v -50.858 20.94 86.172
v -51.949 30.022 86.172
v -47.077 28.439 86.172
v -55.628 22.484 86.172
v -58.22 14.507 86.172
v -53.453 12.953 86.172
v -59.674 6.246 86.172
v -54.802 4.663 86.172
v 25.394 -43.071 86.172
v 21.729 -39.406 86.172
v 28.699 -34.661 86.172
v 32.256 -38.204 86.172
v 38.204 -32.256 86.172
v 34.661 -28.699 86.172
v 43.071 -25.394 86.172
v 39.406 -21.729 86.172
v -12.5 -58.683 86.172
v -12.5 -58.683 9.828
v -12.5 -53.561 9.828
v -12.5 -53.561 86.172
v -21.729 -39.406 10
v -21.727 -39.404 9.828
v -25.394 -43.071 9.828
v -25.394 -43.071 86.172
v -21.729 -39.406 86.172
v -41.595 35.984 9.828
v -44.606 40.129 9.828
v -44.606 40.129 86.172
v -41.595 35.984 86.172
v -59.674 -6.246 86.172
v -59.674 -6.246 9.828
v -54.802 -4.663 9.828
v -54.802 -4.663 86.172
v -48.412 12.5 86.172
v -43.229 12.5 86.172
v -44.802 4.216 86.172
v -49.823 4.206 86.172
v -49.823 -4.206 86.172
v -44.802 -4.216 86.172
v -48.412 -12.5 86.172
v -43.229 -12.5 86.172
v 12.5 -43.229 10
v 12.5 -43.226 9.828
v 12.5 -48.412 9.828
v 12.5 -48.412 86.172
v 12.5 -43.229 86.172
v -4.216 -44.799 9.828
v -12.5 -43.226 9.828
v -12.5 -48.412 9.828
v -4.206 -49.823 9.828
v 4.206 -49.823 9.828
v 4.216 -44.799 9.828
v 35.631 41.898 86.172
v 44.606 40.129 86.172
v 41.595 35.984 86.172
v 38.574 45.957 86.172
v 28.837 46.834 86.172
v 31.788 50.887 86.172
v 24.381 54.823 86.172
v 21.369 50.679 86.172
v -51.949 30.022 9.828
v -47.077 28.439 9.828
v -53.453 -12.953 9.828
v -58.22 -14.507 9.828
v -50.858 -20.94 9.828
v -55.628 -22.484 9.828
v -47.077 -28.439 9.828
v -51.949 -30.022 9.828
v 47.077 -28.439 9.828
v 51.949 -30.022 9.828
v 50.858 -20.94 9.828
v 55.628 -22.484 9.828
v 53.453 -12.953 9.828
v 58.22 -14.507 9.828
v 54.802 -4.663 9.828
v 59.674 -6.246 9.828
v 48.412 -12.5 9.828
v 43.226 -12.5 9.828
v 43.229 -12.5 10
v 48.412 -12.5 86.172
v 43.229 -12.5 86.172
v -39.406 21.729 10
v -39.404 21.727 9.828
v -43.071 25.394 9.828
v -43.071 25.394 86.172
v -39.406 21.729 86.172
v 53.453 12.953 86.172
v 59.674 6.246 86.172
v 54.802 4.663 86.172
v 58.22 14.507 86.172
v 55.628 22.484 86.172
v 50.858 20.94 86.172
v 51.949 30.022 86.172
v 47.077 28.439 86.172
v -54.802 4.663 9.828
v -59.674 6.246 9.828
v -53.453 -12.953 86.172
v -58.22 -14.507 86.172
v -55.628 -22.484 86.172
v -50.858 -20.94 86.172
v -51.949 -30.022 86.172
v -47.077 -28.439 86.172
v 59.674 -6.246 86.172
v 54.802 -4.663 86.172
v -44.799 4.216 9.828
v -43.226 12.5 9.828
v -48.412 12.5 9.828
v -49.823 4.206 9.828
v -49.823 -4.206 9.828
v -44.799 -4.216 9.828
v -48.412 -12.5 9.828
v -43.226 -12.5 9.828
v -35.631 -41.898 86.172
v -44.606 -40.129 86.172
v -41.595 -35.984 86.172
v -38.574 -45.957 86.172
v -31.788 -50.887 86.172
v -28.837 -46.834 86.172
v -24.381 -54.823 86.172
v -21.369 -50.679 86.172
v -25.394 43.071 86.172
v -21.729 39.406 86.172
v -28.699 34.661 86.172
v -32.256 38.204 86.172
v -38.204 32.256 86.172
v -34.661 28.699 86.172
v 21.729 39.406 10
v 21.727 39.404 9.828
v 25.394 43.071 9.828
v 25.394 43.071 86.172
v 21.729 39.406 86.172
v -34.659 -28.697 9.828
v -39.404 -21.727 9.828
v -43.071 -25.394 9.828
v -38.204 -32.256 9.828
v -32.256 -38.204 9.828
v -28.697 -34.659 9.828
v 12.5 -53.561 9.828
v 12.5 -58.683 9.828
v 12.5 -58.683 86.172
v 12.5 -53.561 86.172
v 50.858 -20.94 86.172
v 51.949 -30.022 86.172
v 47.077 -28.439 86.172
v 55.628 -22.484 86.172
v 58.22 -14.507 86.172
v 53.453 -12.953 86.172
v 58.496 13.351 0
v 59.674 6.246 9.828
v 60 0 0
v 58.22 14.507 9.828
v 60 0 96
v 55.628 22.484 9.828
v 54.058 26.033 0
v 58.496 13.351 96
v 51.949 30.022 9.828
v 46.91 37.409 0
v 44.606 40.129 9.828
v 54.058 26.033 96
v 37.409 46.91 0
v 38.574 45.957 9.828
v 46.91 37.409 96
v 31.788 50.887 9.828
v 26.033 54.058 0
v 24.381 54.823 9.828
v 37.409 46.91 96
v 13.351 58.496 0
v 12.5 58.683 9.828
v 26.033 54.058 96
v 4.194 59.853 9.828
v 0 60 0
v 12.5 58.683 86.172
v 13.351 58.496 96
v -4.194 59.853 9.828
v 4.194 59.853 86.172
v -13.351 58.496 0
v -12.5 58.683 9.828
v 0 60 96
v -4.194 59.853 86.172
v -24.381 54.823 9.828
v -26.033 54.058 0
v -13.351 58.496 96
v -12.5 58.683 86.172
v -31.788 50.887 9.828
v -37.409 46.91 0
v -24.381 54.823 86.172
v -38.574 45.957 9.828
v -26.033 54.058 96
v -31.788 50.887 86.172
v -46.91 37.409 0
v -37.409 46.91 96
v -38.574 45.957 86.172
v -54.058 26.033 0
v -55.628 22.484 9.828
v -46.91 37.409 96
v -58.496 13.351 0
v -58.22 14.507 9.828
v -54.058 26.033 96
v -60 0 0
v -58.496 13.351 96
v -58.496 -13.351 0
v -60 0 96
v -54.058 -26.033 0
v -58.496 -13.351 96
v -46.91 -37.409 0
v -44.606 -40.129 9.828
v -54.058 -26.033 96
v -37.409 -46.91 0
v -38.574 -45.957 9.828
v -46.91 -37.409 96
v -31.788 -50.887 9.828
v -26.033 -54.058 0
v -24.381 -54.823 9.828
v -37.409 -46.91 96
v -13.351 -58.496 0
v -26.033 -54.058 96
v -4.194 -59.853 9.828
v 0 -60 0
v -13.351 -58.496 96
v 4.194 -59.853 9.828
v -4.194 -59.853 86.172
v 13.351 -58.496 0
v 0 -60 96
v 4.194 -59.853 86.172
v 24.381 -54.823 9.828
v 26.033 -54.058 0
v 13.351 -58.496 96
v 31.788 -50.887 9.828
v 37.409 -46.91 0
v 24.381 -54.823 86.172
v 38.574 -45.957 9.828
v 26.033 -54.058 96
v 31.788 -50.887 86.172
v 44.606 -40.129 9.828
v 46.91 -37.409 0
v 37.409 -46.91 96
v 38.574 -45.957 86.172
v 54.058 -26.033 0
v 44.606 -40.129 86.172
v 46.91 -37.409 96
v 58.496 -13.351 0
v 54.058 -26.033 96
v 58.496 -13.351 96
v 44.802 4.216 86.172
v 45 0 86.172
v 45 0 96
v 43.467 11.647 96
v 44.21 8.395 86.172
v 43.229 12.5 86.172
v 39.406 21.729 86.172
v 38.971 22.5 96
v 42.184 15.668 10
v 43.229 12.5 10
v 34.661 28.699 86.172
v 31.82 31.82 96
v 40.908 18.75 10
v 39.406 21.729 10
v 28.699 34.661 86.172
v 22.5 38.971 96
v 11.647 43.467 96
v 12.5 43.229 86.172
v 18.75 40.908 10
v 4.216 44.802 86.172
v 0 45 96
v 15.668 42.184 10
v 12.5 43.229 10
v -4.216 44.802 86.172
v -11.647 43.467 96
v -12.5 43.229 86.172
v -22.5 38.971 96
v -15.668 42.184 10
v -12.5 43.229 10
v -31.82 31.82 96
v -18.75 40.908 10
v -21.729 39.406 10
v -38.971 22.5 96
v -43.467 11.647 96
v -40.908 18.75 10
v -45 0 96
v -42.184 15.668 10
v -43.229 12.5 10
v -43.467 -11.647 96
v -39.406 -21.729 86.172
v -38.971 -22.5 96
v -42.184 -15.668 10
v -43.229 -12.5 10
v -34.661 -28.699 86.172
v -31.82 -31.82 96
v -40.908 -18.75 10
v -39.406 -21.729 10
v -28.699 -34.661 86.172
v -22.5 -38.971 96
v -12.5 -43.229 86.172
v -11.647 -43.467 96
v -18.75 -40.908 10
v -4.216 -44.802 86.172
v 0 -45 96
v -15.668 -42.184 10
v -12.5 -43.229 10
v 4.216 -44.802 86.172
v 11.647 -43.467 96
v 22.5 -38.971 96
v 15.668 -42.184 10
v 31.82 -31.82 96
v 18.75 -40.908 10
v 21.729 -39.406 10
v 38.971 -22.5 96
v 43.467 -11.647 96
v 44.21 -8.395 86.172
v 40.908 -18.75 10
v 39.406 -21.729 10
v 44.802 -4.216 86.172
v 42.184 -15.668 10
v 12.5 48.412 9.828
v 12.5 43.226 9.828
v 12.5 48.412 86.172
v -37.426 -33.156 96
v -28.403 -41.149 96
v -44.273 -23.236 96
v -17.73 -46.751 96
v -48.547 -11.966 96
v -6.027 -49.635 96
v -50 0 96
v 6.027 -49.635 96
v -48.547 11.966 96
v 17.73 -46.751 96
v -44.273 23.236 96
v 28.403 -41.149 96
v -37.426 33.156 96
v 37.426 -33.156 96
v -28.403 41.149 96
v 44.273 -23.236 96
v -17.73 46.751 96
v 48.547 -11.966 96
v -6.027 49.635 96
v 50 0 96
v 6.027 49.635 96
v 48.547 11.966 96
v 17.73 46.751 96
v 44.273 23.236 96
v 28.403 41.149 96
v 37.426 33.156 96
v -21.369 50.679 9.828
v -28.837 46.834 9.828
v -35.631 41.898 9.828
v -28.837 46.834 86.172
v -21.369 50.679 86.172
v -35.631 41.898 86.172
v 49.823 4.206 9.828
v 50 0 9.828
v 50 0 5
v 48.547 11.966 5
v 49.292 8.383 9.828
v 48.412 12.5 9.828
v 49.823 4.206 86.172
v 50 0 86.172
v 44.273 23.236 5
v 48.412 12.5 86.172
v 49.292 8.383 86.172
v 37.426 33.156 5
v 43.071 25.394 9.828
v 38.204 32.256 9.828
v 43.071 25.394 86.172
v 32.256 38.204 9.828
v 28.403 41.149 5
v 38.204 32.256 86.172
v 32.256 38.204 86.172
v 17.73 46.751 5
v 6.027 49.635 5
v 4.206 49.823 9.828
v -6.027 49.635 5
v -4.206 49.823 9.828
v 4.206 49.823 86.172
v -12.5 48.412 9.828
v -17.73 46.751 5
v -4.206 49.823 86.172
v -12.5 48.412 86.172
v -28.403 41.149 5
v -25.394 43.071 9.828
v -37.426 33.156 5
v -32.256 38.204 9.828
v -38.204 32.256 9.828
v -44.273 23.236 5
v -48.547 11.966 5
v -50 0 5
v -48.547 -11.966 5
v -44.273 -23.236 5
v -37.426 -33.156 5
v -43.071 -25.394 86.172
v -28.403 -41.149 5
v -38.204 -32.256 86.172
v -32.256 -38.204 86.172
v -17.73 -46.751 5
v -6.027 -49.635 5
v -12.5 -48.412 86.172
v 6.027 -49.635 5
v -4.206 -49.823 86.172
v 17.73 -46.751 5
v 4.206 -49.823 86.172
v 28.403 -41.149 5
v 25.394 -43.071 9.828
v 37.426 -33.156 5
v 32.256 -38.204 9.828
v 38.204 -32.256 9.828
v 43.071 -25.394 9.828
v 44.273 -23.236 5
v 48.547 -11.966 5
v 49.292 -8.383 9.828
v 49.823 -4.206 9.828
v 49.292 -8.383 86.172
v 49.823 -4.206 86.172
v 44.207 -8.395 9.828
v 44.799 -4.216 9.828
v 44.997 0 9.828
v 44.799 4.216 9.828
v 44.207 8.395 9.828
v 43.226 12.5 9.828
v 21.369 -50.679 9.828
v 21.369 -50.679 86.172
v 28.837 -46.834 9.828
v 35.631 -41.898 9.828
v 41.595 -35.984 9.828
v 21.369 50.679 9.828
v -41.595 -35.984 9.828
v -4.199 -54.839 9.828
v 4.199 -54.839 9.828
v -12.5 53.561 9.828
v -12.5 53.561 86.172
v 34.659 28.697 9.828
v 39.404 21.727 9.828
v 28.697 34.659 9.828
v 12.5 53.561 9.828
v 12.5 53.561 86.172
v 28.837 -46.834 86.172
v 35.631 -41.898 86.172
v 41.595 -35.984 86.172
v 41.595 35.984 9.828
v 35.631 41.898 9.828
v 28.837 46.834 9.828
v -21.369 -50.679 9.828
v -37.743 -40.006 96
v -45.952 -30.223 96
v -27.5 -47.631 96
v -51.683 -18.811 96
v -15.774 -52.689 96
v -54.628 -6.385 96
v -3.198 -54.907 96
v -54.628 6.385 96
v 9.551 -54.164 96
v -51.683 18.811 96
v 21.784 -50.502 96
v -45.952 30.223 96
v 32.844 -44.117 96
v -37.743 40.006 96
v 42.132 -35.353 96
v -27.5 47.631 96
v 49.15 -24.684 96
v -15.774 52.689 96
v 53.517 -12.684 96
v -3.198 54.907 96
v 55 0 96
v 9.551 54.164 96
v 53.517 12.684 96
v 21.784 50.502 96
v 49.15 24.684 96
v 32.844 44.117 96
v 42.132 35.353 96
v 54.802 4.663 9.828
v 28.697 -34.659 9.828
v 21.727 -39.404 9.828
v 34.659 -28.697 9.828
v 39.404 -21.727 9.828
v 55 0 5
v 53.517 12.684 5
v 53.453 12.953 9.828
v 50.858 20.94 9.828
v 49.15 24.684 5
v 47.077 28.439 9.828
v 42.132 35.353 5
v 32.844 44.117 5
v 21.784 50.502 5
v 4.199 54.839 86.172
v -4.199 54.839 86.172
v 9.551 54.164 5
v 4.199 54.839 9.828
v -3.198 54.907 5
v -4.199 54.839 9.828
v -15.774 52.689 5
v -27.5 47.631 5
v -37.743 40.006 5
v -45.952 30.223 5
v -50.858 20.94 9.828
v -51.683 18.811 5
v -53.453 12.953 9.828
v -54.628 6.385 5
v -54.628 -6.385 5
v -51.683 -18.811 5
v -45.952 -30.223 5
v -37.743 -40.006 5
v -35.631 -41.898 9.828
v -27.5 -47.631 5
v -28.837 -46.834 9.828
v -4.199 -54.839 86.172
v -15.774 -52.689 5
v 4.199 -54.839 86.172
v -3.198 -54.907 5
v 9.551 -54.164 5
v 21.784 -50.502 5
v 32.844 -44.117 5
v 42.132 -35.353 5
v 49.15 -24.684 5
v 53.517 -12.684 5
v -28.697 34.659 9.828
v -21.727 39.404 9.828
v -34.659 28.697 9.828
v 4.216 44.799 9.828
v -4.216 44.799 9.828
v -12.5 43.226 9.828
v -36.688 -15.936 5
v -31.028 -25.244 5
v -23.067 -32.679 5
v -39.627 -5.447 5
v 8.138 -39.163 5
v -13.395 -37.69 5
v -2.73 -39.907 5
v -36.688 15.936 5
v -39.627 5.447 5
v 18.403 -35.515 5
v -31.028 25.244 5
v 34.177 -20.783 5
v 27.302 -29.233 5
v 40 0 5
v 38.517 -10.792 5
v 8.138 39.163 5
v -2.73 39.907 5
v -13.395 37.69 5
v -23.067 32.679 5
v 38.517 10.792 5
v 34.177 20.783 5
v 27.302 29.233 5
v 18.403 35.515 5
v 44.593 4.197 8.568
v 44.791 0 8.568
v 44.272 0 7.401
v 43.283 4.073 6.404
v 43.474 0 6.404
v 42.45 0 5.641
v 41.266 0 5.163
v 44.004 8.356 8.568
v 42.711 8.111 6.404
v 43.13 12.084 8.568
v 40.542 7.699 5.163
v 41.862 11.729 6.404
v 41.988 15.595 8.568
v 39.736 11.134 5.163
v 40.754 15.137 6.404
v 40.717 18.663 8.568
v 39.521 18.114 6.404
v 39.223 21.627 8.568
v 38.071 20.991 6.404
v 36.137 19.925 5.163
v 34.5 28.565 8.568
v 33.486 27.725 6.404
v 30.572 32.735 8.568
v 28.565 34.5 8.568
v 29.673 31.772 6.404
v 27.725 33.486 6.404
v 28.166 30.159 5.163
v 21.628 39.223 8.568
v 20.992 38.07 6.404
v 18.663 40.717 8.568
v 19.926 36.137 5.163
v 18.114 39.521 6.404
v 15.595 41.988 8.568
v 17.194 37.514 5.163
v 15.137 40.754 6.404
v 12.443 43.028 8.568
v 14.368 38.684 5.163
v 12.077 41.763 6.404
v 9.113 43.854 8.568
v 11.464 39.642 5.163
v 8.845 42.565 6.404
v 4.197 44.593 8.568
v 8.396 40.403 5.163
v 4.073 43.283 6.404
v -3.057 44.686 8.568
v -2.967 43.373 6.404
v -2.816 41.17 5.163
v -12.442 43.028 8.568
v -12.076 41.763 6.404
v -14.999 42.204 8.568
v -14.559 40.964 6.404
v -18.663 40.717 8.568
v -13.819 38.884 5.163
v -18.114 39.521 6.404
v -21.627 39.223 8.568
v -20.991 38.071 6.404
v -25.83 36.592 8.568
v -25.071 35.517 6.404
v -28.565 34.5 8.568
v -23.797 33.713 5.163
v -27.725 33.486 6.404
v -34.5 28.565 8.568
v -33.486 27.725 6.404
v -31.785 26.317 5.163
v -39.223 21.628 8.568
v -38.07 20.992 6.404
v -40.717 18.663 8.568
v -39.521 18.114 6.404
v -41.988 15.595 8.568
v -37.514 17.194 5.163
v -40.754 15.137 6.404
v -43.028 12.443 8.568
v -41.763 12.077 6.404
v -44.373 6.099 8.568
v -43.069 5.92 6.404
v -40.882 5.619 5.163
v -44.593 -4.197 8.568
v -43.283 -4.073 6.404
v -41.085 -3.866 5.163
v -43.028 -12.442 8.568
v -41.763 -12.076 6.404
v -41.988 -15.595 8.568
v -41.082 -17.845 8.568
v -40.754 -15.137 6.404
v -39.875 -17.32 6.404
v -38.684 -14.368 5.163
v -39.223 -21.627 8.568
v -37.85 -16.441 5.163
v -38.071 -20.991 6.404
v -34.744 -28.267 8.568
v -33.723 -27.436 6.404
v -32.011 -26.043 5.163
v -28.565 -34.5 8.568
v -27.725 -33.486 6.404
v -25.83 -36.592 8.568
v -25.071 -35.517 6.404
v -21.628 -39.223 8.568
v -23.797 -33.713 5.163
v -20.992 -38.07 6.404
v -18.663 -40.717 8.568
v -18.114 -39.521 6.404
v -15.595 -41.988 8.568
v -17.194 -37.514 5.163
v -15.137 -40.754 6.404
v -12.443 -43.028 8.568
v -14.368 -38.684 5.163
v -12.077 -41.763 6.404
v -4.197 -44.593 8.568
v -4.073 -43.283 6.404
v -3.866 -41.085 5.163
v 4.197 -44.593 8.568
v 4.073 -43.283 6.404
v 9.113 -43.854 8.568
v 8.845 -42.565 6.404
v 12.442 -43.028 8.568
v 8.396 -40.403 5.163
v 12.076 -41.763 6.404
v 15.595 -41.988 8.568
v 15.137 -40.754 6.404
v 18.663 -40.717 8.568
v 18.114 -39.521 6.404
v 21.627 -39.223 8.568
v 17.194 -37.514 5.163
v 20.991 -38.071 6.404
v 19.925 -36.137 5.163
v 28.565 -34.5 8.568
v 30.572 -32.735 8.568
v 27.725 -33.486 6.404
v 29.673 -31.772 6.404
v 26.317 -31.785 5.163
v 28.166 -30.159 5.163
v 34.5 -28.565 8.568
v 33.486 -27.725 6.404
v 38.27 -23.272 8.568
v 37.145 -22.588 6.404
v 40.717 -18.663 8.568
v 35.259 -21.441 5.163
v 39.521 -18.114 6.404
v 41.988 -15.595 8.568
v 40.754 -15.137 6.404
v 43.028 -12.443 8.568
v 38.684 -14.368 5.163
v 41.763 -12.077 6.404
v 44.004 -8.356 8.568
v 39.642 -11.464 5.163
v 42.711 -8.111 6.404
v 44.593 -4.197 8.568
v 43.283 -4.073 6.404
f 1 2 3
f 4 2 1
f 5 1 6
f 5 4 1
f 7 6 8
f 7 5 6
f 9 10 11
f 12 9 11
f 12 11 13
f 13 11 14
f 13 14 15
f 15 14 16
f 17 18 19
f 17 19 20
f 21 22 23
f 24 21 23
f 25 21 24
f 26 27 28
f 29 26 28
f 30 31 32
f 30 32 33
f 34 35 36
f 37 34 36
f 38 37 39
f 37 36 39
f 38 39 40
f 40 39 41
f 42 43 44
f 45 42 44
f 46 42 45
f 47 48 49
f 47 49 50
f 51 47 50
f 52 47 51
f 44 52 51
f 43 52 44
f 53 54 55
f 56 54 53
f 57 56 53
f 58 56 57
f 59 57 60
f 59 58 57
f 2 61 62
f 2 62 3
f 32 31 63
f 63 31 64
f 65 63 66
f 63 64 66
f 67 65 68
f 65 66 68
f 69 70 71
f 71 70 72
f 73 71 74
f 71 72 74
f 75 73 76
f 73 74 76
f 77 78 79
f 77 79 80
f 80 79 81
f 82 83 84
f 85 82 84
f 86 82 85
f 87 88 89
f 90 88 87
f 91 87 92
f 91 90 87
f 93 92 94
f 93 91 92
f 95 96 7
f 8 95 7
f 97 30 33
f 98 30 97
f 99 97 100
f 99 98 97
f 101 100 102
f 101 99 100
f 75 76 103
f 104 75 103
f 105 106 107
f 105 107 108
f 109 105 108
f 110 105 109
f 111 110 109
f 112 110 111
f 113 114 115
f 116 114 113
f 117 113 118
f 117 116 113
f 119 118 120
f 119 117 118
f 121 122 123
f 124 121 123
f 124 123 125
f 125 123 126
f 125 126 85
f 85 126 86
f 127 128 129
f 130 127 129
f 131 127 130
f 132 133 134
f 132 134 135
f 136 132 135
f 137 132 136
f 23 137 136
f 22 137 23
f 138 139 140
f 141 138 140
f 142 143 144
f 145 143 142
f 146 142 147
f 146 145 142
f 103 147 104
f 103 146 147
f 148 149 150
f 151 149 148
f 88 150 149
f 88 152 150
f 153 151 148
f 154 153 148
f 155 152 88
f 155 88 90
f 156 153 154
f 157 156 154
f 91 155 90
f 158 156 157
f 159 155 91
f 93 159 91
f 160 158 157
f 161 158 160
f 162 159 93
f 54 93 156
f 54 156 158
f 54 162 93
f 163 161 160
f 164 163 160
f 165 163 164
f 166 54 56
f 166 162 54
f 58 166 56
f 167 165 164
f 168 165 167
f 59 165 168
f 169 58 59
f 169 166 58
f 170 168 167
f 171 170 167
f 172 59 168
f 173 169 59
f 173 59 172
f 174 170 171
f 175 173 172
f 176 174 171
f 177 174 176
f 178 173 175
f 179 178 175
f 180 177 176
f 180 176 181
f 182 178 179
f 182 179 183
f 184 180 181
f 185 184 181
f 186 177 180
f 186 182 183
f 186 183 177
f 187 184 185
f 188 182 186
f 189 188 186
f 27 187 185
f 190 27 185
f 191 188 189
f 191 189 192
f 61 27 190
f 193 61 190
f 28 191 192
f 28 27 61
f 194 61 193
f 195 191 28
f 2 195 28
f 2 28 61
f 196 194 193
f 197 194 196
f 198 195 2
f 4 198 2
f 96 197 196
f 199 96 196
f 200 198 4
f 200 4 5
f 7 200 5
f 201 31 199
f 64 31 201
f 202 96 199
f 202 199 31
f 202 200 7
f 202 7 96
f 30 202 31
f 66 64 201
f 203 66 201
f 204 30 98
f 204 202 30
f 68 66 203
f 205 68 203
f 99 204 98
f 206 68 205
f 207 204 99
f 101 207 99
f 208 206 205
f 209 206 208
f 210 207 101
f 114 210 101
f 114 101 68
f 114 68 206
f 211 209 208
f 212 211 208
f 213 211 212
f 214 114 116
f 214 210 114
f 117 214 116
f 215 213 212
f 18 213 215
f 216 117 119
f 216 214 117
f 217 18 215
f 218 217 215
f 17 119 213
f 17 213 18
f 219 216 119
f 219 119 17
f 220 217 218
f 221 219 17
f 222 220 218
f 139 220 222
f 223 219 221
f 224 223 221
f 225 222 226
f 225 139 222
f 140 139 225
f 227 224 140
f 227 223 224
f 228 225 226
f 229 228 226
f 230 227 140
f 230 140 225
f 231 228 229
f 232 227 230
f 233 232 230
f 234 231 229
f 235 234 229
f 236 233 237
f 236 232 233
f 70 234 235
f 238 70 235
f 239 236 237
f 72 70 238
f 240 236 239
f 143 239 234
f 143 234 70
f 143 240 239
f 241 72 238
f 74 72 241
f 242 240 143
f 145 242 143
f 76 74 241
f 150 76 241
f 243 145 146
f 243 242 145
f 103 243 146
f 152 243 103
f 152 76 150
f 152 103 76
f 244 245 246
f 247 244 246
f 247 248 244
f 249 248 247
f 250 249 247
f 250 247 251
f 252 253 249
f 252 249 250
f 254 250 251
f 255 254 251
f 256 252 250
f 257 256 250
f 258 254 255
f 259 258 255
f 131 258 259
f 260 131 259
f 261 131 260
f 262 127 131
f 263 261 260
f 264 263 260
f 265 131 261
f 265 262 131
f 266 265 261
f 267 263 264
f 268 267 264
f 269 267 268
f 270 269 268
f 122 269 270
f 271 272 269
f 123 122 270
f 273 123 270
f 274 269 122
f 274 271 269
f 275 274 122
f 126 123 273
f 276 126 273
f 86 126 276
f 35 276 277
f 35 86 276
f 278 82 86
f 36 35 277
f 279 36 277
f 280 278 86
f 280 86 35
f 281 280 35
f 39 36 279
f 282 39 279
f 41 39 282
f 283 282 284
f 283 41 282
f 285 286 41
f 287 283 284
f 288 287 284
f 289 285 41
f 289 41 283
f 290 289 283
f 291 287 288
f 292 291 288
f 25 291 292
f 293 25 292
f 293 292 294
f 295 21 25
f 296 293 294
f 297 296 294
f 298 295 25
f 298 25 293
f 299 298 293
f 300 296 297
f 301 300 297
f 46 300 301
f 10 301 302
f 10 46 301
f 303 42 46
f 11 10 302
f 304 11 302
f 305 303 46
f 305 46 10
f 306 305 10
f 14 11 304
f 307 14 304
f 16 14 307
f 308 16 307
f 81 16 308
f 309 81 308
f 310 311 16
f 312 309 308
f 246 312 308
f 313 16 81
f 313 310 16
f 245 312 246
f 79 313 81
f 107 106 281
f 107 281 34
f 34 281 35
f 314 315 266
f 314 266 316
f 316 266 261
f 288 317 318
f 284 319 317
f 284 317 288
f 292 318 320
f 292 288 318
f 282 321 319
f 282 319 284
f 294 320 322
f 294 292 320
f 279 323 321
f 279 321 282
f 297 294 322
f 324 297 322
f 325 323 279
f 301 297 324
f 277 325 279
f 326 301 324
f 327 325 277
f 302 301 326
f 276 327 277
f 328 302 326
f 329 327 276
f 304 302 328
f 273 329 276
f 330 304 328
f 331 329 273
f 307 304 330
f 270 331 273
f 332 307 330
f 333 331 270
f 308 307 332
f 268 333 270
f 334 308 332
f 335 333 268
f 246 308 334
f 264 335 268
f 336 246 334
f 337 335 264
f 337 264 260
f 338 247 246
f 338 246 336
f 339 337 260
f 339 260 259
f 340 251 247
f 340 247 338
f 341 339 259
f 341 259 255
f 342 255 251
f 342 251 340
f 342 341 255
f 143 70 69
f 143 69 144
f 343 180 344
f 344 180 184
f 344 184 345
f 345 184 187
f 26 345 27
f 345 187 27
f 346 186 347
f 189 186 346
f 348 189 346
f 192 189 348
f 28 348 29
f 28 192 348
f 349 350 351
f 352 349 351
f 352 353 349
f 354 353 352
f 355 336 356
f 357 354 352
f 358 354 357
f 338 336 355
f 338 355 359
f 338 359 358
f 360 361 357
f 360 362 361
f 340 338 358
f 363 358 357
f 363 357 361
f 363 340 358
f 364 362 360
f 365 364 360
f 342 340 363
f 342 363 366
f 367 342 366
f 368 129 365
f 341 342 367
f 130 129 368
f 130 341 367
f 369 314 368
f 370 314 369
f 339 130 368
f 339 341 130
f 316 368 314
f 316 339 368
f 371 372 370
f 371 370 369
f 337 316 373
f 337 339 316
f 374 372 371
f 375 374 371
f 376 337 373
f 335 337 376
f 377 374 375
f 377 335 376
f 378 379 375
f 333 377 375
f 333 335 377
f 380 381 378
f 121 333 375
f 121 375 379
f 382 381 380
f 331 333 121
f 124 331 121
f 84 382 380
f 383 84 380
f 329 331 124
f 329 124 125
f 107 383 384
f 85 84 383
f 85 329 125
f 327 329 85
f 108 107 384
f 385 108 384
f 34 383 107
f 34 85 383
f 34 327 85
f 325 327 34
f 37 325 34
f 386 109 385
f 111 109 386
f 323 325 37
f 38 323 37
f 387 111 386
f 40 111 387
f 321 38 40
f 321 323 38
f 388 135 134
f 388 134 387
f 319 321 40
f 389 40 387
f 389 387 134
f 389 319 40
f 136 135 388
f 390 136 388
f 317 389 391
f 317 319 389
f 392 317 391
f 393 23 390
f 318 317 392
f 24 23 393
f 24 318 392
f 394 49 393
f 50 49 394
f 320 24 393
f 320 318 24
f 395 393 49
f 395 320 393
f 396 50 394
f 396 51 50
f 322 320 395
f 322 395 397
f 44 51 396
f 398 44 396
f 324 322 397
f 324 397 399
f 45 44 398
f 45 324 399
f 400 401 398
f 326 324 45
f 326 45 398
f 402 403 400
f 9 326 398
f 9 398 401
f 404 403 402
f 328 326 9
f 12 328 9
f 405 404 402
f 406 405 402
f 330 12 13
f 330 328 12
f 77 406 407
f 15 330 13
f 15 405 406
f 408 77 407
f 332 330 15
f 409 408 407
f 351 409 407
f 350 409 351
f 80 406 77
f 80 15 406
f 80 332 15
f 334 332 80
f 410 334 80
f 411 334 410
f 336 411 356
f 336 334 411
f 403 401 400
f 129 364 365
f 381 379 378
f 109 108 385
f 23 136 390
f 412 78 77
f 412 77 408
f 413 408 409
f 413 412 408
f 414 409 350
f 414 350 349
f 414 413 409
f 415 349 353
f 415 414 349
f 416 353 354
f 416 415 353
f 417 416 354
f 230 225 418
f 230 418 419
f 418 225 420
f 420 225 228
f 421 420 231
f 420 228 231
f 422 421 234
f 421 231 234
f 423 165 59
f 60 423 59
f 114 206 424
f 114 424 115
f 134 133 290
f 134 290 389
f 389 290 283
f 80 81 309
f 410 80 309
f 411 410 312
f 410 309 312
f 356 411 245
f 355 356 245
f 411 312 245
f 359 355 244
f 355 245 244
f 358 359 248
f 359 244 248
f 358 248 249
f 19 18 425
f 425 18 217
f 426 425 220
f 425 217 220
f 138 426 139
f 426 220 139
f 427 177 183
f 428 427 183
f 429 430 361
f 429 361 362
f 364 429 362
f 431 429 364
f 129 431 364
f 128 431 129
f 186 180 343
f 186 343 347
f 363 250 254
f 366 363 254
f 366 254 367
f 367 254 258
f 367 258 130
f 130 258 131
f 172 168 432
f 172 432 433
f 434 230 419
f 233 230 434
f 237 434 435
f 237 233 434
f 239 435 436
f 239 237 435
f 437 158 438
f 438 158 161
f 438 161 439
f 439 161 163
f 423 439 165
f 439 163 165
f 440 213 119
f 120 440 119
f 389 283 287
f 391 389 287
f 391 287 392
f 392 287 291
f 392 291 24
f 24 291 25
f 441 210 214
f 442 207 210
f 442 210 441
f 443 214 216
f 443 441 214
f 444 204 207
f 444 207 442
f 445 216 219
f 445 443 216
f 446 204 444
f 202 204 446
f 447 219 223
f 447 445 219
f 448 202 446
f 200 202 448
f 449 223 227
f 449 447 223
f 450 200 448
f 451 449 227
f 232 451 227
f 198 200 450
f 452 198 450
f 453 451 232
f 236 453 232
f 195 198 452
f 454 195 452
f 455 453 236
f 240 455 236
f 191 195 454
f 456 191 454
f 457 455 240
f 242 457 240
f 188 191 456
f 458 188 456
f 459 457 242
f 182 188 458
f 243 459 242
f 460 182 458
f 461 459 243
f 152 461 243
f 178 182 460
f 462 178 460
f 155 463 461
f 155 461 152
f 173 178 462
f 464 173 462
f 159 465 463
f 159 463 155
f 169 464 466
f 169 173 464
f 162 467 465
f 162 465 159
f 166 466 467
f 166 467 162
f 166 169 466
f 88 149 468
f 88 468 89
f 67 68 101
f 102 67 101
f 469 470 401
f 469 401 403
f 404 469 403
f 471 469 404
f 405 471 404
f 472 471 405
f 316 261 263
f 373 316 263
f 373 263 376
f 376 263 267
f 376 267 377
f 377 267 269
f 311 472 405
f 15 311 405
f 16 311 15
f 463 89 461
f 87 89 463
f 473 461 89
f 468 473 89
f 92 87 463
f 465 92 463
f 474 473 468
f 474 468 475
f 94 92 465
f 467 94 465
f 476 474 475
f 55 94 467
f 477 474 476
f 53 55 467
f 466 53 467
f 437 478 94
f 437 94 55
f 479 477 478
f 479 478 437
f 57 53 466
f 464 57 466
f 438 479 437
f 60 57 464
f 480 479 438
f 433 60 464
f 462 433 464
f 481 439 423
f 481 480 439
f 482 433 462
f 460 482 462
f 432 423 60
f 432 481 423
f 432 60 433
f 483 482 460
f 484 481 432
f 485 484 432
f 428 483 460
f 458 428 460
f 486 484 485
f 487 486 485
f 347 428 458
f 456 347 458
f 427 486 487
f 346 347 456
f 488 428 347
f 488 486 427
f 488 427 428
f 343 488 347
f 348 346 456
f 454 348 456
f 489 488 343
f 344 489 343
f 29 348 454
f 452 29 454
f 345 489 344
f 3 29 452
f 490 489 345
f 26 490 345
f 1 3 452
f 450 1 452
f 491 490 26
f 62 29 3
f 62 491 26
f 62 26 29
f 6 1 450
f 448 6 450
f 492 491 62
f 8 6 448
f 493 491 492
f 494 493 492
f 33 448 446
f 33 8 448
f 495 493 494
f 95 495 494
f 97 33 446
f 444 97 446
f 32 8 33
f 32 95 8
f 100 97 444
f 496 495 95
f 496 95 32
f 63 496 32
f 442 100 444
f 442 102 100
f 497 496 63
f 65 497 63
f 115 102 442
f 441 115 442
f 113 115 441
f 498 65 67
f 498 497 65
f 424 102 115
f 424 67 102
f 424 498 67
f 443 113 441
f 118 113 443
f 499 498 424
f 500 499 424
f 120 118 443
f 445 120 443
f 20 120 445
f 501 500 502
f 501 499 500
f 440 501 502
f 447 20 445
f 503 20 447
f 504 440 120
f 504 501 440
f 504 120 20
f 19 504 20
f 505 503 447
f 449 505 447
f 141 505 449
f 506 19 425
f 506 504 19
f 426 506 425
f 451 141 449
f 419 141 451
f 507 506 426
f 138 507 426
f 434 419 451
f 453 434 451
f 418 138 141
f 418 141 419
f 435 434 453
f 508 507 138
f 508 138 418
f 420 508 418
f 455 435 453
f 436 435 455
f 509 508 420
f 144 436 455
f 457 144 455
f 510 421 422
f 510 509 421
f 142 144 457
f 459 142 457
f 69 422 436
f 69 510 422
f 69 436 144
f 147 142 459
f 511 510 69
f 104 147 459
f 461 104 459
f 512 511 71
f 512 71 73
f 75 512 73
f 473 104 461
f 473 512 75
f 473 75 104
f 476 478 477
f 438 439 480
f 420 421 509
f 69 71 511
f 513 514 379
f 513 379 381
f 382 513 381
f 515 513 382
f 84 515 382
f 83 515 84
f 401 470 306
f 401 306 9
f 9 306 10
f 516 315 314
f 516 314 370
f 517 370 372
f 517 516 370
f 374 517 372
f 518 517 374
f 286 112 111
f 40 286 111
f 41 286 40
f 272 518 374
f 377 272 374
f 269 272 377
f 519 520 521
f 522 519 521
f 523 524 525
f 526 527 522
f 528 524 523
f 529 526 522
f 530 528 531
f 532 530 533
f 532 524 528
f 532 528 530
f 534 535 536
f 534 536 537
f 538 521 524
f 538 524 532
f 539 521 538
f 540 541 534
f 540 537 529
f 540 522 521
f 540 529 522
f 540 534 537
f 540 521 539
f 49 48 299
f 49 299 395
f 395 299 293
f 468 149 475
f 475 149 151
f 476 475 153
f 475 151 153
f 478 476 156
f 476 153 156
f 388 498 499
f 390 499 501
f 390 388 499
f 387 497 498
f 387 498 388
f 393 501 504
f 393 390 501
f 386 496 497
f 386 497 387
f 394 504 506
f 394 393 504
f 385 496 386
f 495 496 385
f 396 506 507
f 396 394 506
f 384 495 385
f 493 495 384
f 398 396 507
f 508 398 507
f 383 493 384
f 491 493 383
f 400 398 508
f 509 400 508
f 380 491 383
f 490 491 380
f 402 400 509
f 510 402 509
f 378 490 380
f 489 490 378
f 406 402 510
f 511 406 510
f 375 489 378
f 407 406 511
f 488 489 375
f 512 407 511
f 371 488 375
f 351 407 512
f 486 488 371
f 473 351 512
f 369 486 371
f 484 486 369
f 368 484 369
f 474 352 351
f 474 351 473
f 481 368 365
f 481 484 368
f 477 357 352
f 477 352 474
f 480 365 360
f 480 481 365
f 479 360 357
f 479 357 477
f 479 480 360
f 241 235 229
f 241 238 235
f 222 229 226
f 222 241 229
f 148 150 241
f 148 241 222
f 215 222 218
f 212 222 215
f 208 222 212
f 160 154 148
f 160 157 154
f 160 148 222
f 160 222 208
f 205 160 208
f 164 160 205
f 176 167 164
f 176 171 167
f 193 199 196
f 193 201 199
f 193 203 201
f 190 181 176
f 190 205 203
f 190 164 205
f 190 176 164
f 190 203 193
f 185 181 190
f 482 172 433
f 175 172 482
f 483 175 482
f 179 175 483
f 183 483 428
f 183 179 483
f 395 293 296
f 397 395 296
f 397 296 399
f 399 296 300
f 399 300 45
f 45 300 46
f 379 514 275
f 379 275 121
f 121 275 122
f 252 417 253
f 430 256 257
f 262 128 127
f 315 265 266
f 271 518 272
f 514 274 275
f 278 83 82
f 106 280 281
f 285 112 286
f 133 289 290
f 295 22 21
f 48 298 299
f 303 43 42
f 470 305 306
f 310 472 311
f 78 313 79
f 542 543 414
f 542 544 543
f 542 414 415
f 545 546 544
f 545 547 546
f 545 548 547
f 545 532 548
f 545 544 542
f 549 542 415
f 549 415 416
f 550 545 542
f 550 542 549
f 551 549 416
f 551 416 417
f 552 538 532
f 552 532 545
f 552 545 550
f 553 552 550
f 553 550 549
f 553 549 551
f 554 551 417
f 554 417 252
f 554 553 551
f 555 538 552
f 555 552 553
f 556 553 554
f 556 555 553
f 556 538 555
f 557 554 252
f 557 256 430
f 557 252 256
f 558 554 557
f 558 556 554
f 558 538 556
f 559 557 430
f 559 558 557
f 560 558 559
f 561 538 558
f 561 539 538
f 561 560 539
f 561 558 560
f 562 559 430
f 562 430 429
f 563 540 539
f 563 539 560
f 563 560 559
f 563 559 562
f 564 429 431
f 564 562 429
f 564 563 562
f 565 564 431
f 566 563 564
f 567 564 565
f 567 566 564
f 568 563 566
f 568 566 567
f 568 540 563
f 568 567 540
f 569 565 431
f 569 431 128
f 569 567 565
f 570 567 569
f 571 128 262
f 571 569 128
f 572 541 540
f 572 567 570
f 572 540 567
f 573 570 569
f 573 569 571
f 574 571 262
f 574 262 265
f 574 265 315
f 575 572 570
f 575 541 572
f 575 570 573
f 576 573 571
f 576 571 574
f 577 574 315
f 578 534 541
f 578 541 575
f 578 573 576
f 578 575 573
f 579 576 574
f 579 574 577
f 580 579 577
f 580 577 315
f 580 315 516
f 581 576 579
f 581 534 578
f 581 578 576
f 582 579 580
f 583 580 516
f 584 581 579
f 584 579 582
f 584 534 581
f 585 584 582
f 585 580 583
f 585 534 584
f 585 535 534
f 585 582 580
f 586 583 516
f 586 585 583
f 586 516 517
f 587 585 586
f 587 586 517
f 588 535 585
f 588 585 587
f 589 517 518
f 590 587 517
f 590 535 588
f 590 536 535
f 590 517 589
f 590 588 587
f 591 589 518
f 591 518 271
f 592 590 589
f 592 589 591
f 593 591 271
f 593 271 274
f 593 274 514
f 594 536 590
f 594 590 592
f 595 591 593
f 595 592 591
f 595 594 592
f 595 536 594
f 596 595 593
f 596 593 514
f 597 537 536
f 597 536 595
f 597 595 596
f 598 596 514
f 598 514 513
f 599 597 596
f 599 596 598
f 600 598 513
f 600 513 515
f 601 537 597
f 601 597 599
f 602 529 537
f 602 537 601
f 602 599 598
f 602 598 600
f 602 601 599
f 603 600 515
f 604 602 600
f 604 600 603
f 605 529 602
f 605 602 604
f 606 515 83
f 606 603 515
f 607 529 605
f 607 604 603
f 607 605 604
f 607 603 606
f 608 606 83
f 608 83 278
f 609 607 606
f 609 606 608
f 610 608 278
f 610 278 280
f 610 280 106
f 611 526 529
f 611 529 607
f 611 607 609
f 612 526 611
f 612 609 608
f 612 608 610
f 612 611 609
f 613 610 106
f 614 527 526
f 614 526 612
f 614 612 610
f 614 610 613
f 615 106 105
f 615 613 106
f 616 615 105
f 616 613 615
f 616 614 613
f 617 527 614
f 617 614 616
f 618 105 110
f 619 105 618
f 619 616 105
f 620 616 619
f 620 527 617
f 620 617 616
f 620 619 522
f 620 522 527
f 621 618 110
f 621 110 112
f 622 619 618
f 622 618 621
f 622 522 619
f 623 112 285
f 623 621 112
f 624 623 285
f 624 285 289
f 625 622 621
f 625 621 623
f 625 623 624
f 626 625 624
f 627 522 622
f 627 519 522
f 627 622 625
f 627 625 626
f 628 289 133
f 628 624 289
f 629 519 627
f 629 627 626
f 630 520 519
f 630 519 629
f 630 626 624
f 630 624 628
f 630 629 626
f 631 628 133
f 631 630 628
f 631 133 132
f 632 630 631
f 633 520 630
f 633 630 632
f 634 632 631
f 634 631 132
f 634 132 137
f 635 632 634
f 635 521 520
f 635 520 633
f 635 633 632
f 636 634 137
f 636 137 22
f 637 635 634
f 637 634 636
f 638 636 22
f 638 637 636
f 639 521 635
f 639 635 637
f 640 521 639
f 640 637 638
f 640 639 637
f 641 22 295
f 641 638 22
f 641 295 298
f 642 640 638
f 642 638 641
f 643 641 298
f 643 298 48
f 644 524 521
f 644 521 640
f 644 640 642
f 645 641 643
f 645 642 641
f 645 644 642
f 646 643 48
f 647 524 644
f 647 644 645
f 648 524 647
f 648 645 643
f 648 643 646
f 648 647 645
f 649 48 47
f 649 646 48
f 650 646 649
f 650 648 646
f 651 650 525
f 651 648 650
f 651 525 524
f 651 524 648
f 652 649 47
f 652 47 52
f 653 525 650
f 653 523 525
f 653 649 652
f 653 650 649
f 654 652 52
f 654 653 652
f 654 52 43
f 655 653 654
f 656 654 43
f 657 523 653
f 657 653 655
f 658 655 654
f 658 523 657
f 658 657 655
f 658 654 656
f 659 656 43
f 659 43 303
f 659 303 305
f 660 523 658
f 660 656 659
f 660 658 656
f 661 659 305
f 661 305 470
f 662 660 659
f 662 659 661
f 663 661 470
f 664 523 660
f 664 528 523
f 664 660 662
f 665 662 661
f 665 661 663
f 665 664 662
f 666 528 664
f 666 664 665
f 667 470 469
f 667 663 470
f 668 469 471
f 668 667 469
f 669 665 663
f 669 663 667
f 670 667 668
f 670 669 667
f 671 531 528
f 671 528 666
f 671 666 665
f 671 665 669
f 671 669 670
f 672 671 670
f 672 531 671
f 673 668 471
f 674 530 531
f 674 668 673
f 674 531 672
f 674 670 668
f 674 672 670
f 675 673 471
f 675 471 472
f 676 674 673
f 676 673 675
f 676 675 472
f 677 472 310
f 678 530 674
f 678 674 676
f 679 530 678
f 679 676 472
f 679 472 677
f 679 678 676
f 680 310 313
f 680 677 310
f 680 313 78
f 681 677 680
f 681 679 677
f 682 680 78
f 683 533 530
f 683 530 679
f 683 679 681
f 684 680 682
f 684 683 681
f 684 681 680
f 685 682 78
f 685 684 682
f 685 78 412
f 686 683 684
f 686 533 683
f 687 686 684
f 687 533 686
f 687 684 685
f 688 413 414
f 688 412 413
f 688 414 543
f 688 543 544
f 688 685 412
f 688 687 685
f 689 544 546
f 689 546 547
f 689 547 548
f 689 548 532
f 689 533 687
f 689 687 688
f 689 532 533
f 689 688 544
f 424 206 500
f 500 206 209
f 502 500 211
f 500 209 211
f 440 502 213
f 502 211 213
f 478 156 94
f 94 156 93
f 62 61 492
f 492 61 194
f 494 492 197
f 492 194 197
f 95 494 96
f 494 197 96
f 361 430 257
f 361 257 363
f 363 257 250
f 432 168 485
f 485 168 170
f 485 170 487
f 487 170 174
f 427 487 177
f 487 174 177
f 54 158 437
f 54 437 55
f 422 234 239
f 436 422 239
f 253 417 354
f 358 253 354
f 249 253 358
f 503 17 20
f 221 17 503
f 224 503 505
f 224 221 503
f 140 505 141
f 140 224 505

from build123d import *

# Parameters (mm, degrees)
F2_W            = 25
F2_H            = 76.3443418741
F3_REACH        = 140.3344210413
F3_COPIES_COUNT = 8
F5_W            = 25
F5_H            = 76.3443418741
F6_REACH        = 215.3344210413
F6_COPIES_COUNT = 10


# Not quite as in the source:
# - a pattern or mirror of a feature is missing from the dataset's text; its kind, count and spacing are read off the source's solid


with BuildPart() as f1:
    # F0 (on Front) → F1 (revolve)
    with BuildSketch(Plane.XZ):
        with BuildLine():
            Line((0, 5), (0, 0))
            Line((0, 0), (60, 0))
            Line((60, 0), (60, 96))
            Line((60, 96), (55, 96))
            Line((55, 96), (55, 5))
            Line((55, 5), (50, 5))
            Line((50, 5), (50, 96))
            Line((50, 96), (45, 96))
            Line((45, 96), (45, 10))
            ThreePointArc((45, 10), (43.5355339059, 6.4644660941), (40, 5))
            Line((40, 5), (0, 5))
        make_face()
    revolve(axis=Axis((0, 0, 2.5), (0, 0, 1)))

    f3_end = f1.faces().sort_by_distance((-50, 0, 50.5))[0]
    # F2 (on Front) → F3 (cut, up to a face of the model that its end follows)
    with BuildSketch(Plane.XZ):
        with Locations((0, 48)):
            Rectangle(F2_W, F2_H)
    f3_long = extrude(amount=F3_REACH, mode=Mode.PRIVATE)
    f3 = split(f3_long, bisect_by=f3_end, keep=Keep.BOTTOM, mode=Mode.PRIVATE)
    add(f3, mode=Mode.SUBTRACT)

    # F3_copies: F3 ×8 about axis
    f3_copies_axis = Axis((0, 0, 0), (0, 0, 1))
    for i in range(1, F3_COPIES_COUNT):
        add(f3.rotate(f3_copies_axis, i * 360 / F3_COPIES_COUNT), mode=Mode.SUBTRACT)

    f6_end = f1.faces().sort_by_distance((-55, 0, 50.5))[0]
    # F5 (on offset) → F6 (cut, up to a face of the model that its end follows)
    with BuildSketch(Plane.XZ.offset(75)):
        with Locations((0, 48)):
            Rectangle(F5_W, F5_H)
    f6_long = extrude(amount=-F6_REACH, mode=Mode.PRIVATE)
    f6 = split(f6_long, bisect_by=f6_end, keep=Keep.ALL, mode=Mode.PRIVATE).solids().sort_by_distance((0, -75, 48))[0]
    add(f6, mode=Mode.SUBTRACT)

    # F6_copies: F6 ×10 about axis
    f6_copies_axis = Axis((0, 0, 0), (0, 0, 1))
    for i in range(1, F6_COPIES_COUNT):
        add(f6.rotate(f6_copies_axis, i * 360 / F6_COPIES_COUNT), mode=Mode.SUBTRACT)


solid = f1.part
